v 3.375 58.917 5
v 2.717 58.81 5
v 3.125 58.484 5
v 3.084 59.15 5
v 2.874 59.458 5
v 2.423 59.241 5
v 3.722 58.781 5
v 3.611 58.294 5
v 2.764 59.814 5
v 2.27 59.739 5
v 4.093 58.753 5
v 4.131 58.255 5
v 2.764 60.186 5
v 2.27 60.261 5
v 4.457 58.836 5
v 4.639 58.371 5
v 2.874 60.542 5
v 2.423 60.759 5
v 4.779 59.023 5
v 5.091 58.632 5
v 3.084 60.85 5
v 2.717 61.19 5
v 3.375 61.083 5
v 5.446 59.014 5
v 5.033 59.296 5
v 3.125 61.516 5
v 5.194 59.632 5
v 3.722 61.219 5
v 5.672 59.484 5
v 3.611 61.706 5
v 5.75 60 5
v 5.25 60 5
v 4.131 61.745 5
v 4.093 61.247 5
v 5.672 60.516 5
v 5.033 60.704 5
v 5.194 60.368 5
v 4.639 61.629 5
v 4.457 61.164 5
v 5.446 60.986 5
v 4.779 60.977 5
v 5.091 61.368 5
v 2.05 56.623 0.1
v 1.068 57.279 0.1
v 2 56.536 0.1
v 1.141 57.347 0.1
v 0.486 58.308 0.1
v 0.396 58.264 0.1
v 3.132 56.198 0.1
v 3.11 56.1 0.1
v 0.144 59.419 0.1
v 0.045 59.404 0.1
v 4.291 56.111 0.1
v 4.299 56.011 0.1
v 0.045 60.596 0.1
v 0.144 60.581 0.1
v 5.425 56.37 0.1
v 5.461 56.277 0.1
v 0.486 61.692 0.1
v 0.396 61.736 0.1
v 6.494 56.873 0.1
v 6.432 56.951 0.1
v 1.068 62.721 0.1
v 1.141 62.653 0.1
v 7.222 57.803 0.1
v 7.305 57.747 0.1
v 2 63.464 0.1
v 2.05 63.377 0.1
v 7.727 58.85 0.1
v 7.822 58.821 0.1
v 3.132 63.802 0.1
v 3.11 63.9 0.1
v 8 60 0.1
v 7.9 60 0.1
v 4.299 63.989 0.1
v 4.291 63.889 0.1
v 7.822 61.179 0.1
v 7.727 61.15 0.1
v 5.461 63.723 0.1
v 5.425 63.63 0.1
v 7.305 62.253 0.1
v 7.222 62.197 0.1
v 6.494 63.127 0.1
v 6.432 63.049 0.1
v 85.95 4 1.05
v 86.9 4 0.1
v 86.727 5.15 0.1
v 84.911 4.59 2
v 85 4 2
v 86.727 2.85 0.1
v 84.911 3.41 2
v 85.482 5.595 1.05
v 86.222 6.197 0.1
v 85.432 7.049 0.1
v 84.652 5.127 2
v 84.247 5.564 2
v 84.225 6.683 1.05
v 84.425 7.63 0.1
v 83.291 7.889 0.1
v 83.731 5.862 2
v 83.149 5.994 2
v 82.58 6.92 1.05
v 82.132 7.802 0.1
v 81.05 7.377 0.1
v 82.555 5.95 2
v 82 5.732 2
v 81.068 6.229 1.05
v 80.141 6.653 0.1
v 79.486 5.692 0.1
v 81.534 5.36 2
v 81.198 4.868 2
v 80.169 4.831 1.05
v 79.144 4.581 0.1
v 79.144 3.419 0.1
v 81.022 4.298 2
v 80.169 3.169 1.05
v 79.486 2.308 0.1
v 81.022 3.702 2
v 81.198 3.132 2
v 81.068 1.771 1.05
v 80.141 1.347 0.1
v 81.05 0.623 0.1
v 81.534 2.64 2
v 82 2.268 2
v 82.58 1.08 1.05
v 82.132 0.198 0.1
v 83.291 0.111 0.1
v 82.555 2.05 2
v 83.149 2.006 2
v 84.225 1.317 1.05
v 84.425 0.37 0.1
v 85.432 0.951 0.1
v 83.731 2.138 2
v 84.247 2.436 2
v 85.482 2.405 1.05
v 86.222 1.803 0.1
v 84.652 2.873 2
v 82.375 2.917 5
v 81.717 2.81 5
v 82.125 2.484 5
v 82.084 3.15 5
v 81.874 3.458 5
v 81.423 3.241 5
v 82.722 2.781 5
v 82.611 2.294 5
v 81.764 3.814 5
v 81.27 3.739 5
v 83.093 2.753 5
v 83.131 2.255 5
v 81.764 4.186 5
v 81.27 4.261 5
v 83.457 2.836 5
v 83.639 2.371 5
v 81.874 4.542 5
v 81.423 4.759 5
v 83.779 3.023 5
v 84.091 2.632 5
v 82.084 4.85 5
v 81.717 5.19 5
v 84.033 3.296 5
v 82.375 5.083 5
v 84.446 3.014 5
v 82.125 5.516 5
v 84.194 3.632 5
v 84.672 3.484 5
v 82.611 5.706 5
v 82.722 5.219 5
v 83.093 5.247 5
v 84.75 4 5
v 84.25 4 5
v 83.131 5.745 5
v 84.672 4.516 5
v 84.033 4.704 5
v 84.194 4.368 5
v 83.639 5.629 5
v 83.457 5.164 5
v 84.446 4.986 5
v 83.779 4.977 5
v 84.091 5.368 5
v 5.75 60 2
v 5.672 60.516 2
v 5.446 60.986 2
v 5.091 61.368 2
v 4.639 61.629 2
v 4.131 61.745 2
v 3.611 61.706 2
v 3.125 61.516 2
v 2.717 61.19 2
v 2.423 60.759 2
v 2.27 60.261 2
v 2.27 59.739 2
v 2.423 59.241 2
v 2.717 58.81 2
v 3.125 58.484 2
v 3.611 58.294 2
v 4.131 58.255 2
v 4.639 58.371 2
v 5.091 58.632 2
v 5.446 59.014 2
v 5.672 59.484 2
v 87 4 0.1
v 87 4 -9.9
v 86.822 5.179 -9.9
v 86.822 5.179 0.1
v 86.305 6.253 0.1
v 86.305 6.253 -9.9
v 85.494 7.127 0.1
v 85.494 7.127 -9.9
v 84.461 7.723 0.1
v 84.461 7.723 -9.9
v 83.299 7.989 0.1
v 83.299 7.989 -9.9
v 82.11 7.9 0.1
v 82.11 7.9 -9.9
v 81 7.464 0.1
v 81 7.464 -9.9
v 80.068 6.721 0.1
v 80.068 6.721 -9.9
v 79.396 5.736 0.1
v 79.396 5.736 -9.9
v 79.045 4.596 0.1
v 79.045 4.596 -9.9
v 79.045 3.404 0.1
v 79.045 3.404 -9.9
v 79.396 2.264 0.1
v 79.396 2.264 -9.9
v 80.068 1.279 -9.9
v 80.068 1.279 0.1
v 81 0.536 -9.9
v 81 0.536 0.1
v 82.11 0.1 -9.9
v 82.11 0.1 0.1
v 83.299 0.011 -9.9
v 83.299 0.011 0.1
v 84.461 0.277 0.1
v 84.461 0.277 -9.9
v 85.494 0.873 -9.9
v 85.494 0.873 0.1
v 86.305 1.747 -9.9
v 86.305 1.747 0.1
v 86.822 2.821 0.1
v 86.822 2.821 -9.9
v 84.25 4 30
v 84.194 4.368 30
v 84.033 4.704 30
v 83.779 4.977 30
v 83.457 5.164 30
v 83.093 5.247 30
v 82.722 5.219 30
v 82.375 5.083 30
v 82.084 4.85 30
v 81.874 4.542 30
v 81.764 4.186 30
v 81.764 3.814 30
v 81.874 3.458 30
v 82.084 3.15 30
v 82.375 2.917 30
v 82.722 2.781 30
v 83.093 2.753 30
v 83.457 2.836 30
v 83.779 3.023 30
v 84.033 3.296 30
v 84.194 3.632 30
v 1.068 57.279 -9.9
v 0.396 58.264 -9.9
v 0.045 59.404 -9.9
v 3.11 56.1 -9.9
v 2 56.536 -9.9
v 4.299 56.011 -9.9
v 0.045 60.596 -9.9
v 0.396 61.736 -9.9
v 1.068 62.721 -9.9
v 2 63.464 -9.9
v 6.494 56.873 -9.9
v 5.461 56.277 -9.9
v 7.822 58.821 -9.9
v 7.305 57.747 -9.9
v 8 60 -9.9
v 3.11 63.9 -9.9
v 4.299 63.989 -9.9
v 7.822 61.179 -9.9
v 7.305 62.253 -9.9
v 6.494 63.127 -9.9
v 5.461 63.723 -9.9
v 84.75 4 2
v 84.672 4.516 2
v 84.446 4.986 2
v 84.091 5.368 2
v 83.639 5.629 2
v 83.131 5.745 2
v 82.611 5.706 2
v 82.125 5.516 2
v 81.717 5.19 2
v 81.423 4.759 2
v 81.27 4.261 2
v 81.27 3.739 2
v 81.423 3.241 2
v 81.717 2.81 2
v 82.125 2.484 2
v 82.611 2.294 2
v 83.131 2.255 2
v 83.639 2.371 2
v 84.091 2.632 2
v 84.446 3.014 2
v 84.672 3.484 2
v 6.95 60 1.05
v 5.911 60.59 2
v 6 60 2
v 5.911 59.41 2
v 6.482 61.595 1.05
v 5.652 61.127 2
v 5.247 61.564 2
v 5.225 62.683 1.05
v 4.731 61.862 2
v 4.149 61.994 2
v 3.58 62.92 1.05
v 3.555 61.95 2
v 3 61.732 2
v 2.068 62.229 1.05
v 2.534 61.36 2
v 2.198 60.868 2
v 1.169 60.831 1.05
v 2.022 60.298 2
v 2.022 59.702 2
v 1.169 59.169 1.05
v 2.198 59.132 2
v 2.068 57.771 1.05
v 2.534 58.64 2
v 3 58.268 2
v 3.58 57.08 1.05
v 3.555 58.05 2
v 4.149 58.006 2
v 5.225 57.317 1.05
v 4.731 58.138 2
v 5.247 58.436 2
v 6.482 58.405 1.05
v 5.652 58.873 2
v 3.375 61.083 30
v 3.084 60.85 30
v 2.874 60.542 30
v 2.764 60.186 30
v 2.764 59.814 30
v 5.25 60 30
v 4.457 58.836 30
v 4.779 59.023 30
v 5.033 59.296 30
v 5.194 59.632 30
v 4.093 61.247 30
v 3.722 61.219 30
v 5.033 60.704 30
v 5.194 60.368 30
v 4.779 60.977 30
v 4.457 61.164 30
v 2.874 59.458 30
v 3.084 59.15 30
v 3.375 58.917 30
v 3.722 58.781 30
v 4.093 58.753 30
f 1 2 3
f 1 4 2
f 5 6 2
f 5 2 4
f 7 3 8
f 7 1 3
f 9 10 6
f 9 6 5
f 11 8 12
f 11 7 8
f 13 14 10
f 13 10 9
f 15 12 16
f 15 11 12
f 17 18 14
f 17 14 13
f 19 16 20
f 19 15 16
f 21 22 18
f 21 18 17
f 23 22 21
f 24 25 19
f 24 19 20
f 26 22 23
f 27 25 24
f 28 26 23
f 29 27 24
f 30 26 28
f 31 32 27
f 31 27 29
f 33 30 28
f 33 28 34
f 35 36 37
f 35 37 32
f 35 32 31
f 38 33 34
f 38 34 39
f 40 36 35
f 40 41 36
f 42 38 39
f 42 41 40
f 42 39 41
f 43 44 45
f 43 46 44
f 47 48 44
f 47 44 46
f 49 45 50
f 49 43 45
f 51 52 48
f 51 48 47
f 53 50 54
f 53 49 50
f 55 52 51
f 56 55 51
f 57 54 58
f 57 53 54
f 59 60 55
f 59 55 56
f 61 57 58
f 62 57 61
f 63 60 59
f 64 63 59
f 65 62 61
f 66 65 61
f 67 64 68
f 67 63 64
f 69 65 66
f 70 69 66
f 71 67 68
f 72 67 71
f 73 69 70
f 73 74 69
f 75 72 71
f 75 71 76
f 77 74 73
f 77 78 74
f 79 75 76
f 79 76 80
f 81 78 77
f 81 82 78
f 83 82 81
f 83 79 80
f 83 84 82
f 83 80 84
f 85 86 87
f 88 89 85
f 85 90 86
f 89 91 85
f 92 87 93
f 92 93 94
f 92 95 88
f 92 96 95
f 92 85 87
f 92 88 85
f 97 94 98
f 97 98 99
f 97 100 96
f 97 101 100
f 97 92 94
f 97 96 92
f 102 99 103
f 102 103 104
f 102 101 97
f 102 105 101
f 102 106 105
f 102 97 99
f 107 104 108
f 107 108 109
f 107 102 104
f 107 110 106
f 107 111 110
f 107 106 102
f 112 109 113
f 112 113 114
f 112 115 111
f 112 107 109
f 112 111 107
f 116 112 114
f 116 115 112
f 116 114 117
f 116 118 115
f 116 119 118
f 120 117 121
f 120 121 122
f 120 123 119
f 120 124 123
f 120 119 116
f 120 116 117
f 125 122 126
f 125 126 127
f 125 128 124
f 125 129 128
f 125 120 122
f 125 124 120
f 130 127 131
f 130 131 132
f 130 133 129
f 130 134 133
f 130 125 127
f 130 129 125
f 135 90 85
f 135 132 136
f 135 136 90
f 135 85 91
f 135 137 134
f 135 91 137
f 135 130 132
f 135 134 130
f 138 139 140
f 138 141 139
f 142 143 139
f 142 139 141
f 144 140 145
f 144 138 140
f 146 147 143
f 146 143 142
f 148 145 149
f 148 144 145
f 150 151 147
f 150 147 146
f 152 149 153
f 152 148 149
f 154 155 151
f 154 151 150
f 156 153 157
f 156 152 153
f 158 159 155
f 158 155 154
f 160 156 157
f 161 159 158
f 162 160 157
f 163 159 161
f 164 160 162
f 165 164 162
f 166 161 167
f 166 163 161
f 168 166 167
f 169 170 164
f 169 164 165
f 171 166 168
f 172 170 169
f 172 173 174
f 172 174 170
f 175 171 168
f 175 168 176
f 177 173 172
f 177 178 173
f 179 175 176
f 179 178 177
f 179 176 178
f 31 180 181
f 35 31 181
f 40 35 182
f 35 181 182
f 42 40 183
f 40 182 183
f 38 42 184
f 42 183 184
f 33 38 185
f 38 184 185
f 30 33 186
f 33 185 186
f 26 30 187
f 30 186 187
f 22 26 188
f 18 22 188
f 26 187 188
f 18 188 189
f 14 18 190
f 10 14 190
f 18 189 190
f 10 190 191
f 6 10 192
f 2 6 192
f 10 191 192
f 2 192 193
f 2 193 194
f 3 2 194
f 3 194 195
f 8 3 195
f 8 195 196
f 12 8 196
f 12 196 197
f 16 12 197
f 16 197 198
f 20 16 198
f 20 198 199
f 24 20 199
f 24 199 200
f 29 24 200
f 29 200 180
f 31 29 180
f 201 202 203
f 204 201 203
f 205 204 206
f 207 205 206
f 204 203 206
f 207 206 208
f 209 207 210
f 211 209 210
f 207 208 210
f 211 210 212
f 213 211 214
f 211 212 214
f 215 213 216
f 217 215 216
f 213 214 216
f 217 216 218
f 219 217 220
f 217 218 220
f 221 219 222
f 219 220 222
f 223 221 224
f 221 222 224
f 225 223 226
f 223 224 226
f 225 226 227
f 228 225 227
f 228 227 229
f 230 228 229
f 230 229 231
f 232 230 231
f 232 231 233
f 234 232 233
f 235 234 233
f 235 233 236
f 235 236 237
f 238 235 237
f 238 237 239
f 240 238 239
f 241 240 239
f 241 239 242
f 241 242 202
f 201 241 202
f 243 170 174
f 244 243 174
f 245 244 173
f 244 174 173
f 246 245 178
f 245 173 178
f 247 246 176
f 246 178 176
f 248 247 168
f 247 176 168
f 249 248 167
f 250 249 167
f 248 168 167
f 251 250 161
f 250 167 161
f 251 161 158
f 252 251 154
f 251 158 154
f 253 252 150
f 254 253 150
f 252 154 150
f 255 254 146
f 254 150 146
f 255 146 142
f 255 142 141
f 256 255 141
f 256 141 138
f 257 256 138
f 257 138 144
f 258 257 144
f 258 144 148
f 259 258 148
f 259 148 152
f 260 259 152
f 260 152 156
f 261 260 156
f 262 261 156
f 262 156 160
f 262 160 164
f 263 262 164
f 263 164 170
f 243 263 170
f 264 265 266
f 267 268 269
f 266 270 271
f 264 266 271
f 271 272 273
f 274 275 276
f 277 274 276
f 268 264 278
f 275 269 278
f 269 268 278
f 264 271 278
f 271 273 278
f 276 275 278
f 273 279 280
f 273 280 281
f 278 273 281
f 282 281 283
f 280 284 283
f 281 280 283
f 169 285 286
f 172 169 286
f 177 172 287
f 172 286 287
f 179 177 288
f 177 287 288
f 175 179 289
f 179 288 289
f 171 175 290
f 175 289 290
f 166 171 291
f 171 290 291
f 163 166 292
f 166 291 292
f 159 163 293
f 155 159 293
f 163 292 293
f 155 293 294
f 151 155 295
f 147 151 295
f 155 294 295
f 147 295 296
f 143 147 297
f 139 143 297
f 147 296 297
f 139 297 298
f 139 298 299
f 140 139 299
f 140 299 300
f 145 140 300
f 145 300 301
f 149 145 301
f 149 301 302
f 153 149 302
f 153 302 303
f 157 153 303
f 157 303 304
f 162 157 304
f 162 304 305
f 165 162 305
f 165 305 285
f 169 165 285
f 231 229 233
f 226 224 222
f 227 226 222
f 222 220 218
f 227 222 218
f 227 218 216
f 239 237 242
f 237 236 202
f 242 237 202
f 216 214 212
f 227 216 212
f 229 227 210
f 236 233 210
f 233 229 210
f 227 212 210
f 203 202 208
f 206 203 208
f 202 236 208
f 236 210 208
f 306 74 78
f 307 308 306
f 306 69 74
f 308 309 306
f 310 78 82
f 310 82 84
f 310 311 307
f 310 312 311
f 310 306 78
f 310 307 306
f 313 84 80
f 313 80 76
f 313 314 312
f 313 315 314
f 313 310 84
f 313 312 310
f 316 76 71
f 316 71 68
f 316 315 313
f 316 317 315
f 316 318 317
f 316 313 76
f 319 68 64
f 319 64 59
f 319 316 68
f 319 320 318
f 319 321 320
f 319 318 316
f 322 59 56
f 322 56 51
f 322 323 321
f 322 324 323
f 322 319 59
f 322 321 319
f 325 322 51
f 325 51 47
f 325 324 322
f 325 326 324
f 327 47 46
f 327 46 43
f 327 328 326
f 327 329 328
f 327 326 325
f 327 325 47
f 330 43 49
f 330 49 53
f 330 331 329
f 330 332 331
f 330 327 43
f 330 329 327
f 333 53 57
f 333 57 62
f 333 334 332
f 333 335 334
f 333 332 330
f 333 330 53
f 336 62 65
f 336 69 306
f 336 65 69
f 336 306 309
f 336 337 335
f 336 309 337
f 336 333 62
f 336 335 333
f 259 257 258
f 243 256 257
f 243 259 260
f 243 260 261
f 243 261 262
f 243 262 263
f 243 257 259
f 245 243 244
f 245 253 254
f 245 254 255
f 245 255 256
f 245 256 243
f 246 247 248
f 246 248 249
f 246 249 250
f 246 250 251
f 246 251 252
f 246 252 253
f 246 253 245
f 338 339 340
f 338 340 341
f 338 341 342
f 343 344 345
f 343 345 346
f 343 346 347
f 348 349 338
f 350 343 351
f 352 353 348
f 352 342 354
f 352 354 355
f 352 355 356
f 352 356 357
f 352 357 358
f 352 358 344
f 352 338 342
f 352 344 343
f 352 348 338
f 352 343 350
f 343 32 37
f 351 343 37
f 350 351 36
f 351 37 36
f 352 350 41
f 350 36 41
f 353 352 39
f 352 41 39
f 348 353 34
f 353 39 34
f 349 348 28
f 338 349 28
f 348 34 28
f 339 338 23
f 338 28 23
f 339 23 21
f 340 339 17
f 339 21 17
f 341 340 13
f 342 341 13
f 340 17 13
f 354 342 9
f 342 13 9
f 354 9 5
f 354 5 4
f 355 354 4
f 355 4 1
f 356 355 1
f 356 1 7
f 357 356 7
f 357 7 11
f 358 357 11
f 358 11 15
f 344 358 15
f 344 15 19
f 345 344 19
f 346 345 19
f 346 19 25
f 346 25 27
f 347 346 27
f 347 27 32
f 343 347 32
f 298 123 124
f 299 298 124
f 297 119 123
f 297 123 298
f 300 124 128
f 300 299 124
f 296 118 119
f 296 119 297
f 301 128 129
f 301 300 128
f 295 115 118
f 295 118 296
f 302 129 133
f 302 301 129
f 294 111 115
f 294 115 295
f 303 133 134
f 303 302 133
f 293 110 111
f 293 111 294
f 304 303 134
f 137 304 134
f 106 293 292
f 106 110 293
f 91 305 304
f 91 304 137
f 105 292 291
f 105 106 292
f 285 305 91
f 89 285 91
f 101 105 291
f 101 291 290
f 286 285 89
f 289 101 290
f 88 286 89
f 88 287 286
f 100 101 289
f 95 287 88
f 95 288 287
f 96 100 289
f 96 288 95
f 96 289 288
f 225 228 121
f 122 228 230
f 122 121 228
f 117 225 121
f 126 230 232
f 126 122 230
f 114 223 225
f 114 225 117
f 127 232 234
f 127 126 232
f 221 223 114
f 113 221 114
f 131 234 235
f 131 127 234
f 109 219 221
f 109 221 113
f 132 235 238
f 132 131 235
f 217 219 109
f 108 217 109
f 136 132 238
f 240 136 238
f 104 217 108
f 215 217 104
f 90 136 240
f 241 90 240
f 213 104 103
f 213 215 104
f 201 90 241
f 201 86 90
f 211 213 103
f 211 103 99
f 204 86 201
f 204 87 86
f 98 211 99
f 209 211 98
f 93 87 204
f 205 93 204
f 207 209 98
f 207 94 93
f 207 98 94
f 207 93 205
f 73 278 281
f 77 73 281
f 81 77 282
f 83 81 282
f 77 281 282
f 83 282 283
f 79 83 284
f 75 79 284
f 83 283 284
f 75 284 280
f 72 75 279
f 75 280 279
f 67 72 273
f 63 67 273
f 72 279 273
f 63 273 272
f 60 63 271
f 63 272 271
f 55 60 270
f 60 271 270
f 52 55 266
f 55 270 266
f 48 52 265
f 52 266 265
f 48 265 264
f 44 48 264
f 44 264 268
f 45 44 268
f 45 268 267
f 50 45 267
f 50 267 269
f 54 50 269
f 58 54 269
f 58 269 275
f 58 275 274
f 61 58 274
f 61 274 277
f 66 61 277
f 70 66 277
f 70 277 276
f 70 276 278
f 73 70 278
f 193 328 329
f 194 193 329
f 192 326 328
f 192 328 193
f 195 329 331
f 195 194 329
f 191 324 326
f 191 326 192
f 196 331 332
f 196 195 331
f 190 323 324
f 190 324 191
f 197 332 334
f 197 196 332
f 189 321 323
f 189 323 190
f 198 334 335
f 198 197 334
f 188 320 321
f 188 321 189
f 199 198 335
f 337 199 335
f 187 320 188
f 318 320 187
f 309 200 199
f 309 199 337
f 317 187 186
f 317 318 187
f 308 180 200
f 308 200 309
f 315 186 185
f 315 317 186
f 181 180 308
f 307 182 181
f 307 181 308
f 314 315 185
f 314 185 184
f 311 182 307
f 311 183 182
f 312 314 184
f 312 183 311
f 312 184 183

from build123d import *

# Parameters (mm, degrees)
CYLINDER016_R     = 4
CYLINDER016_DEPTH = 10
CYLINDER017_R     = 4
CYLINDER017_DEPTH = 10
CYLINDER014_R     = 1.25
CYLINDER014_DEPTH = 30
CYLINDER015_R     = 1.75
CYLINDER015_DEPTH = 5
CYLINDER013_R     = 1.25
CYLINDER013_DEPTH = 30
CYLINDER012_R     = 1.75
CYLINDER012_DEPTH = 5


with BuildPart() as cylinder016:
    # Cylinder016 → Cylinder016 (new body)
    with BuildSketch(Plane(origin=(4, 60, -9.9), x_dir=(1, 0, 0), z_dir=(0, 0, 1))):
        Circle(CYLINDER016_R)
    extrude(amount=CYLINDER016_DEPTH)


with BuildPart() as cylinder017:
    # Cylinder017 → Cylinder017 (new body)
    with BuildSketch(Plane(origin=(83, 4, -9.9), x_dir=(1, 0, 0), z_dir=(0, 0, 1))):
        Circle(CYLINDER017_R)
    extrude(amount=CYLINDER017_DEPTH)


with BuildPart() as cone001:
    # Cone001 → Cone001 (revolve)
    with BuildSketch(Plane(origin=(83, 4, 0), x_dir=(1, 0, 0), z_dir=(0, -1, 0))):
        Polygon((0, 0), (4, 0), (2, 2), (0, 2), align=None)
    revolve(axis=Axis((83, 4, 0), (0, 0, 1)))


with BuildPart() as cylinder014:
    # Cylinder014 → Cylinder014 (new body)
    with BuildSketch(Plane(origin=(83, 4, 0), x_dir=(1, 0, 0), z_dir=(0, 0, 1))):
        Circle(CYLINDER014_R)
    extrude(amount=CYLINDER014_DEPTH)


with BuildPart() as fusion006:
    # Cylinder015 → Cylinder015 (new body)
    with BuildSketch(Plane(origin=(83, 4, 0), x_dir=(1, 0, 0), z_dir=(0, 0, 1))):
        Circle(CYLINDER015_R)
    extrude(amount=CYLINDER015_DEPTH)

    # Fusion006: union Cone001, Cylinder014
    add(cone001.part)
    add(cylinder014.part)


with BuildPart() as fusion006_1:
    # Fusion006 placement: moved
    add(fusion006.part.moved(Location((-79, 56, 0))))


with BuildPart() as cone:
    # Cone → Cone (revolve)
    with BuildSketch(Plane(origin=(83, 4, 0), x_dir=(1, 0, 0), z_dir=(0, -1, 0))):
        Polygon((0, 0), (4, 0), (2, 2), (0, 2), align=None)
    revolve(axis=Axis((83, 4, 0), (0, 0, 1)))


with BuildPart() as cylinder013:
    # Cylinder013 → Cylinder013 (new body)
    with BuildSketch(Plane(origin=(83, 4, 0), x_dir=(1, 0, 0), z_dir=(0, 0, 1))):
        Circle(CYLINDER013_R)
    extrude(amount=CYLINDER013_DEPTH)


with BuildPart() as fusion008:
    # Cylinder012 → Cylinder012 (new body)
    with BuildSketch(Plane(origin=(83, 4, 0), x_dir=(1, 0, 0), z_dir=(0, 0, 1))):
        Circle(CYLINDER012_R)
    extrude(amount=CYLINDER012_DEPTH)

    # Fusion005: union Cone, Cylinder013
    add(cone.part)
    add(cylinder013.part)

    # Fusion007: union Fusion006
    add(fusion006_1.part)

    # Fusion008: union Cylinder016, Cylinder017
    add(cylinder016.part)
    add(cylinder017.part)


solid = fusion008.part
